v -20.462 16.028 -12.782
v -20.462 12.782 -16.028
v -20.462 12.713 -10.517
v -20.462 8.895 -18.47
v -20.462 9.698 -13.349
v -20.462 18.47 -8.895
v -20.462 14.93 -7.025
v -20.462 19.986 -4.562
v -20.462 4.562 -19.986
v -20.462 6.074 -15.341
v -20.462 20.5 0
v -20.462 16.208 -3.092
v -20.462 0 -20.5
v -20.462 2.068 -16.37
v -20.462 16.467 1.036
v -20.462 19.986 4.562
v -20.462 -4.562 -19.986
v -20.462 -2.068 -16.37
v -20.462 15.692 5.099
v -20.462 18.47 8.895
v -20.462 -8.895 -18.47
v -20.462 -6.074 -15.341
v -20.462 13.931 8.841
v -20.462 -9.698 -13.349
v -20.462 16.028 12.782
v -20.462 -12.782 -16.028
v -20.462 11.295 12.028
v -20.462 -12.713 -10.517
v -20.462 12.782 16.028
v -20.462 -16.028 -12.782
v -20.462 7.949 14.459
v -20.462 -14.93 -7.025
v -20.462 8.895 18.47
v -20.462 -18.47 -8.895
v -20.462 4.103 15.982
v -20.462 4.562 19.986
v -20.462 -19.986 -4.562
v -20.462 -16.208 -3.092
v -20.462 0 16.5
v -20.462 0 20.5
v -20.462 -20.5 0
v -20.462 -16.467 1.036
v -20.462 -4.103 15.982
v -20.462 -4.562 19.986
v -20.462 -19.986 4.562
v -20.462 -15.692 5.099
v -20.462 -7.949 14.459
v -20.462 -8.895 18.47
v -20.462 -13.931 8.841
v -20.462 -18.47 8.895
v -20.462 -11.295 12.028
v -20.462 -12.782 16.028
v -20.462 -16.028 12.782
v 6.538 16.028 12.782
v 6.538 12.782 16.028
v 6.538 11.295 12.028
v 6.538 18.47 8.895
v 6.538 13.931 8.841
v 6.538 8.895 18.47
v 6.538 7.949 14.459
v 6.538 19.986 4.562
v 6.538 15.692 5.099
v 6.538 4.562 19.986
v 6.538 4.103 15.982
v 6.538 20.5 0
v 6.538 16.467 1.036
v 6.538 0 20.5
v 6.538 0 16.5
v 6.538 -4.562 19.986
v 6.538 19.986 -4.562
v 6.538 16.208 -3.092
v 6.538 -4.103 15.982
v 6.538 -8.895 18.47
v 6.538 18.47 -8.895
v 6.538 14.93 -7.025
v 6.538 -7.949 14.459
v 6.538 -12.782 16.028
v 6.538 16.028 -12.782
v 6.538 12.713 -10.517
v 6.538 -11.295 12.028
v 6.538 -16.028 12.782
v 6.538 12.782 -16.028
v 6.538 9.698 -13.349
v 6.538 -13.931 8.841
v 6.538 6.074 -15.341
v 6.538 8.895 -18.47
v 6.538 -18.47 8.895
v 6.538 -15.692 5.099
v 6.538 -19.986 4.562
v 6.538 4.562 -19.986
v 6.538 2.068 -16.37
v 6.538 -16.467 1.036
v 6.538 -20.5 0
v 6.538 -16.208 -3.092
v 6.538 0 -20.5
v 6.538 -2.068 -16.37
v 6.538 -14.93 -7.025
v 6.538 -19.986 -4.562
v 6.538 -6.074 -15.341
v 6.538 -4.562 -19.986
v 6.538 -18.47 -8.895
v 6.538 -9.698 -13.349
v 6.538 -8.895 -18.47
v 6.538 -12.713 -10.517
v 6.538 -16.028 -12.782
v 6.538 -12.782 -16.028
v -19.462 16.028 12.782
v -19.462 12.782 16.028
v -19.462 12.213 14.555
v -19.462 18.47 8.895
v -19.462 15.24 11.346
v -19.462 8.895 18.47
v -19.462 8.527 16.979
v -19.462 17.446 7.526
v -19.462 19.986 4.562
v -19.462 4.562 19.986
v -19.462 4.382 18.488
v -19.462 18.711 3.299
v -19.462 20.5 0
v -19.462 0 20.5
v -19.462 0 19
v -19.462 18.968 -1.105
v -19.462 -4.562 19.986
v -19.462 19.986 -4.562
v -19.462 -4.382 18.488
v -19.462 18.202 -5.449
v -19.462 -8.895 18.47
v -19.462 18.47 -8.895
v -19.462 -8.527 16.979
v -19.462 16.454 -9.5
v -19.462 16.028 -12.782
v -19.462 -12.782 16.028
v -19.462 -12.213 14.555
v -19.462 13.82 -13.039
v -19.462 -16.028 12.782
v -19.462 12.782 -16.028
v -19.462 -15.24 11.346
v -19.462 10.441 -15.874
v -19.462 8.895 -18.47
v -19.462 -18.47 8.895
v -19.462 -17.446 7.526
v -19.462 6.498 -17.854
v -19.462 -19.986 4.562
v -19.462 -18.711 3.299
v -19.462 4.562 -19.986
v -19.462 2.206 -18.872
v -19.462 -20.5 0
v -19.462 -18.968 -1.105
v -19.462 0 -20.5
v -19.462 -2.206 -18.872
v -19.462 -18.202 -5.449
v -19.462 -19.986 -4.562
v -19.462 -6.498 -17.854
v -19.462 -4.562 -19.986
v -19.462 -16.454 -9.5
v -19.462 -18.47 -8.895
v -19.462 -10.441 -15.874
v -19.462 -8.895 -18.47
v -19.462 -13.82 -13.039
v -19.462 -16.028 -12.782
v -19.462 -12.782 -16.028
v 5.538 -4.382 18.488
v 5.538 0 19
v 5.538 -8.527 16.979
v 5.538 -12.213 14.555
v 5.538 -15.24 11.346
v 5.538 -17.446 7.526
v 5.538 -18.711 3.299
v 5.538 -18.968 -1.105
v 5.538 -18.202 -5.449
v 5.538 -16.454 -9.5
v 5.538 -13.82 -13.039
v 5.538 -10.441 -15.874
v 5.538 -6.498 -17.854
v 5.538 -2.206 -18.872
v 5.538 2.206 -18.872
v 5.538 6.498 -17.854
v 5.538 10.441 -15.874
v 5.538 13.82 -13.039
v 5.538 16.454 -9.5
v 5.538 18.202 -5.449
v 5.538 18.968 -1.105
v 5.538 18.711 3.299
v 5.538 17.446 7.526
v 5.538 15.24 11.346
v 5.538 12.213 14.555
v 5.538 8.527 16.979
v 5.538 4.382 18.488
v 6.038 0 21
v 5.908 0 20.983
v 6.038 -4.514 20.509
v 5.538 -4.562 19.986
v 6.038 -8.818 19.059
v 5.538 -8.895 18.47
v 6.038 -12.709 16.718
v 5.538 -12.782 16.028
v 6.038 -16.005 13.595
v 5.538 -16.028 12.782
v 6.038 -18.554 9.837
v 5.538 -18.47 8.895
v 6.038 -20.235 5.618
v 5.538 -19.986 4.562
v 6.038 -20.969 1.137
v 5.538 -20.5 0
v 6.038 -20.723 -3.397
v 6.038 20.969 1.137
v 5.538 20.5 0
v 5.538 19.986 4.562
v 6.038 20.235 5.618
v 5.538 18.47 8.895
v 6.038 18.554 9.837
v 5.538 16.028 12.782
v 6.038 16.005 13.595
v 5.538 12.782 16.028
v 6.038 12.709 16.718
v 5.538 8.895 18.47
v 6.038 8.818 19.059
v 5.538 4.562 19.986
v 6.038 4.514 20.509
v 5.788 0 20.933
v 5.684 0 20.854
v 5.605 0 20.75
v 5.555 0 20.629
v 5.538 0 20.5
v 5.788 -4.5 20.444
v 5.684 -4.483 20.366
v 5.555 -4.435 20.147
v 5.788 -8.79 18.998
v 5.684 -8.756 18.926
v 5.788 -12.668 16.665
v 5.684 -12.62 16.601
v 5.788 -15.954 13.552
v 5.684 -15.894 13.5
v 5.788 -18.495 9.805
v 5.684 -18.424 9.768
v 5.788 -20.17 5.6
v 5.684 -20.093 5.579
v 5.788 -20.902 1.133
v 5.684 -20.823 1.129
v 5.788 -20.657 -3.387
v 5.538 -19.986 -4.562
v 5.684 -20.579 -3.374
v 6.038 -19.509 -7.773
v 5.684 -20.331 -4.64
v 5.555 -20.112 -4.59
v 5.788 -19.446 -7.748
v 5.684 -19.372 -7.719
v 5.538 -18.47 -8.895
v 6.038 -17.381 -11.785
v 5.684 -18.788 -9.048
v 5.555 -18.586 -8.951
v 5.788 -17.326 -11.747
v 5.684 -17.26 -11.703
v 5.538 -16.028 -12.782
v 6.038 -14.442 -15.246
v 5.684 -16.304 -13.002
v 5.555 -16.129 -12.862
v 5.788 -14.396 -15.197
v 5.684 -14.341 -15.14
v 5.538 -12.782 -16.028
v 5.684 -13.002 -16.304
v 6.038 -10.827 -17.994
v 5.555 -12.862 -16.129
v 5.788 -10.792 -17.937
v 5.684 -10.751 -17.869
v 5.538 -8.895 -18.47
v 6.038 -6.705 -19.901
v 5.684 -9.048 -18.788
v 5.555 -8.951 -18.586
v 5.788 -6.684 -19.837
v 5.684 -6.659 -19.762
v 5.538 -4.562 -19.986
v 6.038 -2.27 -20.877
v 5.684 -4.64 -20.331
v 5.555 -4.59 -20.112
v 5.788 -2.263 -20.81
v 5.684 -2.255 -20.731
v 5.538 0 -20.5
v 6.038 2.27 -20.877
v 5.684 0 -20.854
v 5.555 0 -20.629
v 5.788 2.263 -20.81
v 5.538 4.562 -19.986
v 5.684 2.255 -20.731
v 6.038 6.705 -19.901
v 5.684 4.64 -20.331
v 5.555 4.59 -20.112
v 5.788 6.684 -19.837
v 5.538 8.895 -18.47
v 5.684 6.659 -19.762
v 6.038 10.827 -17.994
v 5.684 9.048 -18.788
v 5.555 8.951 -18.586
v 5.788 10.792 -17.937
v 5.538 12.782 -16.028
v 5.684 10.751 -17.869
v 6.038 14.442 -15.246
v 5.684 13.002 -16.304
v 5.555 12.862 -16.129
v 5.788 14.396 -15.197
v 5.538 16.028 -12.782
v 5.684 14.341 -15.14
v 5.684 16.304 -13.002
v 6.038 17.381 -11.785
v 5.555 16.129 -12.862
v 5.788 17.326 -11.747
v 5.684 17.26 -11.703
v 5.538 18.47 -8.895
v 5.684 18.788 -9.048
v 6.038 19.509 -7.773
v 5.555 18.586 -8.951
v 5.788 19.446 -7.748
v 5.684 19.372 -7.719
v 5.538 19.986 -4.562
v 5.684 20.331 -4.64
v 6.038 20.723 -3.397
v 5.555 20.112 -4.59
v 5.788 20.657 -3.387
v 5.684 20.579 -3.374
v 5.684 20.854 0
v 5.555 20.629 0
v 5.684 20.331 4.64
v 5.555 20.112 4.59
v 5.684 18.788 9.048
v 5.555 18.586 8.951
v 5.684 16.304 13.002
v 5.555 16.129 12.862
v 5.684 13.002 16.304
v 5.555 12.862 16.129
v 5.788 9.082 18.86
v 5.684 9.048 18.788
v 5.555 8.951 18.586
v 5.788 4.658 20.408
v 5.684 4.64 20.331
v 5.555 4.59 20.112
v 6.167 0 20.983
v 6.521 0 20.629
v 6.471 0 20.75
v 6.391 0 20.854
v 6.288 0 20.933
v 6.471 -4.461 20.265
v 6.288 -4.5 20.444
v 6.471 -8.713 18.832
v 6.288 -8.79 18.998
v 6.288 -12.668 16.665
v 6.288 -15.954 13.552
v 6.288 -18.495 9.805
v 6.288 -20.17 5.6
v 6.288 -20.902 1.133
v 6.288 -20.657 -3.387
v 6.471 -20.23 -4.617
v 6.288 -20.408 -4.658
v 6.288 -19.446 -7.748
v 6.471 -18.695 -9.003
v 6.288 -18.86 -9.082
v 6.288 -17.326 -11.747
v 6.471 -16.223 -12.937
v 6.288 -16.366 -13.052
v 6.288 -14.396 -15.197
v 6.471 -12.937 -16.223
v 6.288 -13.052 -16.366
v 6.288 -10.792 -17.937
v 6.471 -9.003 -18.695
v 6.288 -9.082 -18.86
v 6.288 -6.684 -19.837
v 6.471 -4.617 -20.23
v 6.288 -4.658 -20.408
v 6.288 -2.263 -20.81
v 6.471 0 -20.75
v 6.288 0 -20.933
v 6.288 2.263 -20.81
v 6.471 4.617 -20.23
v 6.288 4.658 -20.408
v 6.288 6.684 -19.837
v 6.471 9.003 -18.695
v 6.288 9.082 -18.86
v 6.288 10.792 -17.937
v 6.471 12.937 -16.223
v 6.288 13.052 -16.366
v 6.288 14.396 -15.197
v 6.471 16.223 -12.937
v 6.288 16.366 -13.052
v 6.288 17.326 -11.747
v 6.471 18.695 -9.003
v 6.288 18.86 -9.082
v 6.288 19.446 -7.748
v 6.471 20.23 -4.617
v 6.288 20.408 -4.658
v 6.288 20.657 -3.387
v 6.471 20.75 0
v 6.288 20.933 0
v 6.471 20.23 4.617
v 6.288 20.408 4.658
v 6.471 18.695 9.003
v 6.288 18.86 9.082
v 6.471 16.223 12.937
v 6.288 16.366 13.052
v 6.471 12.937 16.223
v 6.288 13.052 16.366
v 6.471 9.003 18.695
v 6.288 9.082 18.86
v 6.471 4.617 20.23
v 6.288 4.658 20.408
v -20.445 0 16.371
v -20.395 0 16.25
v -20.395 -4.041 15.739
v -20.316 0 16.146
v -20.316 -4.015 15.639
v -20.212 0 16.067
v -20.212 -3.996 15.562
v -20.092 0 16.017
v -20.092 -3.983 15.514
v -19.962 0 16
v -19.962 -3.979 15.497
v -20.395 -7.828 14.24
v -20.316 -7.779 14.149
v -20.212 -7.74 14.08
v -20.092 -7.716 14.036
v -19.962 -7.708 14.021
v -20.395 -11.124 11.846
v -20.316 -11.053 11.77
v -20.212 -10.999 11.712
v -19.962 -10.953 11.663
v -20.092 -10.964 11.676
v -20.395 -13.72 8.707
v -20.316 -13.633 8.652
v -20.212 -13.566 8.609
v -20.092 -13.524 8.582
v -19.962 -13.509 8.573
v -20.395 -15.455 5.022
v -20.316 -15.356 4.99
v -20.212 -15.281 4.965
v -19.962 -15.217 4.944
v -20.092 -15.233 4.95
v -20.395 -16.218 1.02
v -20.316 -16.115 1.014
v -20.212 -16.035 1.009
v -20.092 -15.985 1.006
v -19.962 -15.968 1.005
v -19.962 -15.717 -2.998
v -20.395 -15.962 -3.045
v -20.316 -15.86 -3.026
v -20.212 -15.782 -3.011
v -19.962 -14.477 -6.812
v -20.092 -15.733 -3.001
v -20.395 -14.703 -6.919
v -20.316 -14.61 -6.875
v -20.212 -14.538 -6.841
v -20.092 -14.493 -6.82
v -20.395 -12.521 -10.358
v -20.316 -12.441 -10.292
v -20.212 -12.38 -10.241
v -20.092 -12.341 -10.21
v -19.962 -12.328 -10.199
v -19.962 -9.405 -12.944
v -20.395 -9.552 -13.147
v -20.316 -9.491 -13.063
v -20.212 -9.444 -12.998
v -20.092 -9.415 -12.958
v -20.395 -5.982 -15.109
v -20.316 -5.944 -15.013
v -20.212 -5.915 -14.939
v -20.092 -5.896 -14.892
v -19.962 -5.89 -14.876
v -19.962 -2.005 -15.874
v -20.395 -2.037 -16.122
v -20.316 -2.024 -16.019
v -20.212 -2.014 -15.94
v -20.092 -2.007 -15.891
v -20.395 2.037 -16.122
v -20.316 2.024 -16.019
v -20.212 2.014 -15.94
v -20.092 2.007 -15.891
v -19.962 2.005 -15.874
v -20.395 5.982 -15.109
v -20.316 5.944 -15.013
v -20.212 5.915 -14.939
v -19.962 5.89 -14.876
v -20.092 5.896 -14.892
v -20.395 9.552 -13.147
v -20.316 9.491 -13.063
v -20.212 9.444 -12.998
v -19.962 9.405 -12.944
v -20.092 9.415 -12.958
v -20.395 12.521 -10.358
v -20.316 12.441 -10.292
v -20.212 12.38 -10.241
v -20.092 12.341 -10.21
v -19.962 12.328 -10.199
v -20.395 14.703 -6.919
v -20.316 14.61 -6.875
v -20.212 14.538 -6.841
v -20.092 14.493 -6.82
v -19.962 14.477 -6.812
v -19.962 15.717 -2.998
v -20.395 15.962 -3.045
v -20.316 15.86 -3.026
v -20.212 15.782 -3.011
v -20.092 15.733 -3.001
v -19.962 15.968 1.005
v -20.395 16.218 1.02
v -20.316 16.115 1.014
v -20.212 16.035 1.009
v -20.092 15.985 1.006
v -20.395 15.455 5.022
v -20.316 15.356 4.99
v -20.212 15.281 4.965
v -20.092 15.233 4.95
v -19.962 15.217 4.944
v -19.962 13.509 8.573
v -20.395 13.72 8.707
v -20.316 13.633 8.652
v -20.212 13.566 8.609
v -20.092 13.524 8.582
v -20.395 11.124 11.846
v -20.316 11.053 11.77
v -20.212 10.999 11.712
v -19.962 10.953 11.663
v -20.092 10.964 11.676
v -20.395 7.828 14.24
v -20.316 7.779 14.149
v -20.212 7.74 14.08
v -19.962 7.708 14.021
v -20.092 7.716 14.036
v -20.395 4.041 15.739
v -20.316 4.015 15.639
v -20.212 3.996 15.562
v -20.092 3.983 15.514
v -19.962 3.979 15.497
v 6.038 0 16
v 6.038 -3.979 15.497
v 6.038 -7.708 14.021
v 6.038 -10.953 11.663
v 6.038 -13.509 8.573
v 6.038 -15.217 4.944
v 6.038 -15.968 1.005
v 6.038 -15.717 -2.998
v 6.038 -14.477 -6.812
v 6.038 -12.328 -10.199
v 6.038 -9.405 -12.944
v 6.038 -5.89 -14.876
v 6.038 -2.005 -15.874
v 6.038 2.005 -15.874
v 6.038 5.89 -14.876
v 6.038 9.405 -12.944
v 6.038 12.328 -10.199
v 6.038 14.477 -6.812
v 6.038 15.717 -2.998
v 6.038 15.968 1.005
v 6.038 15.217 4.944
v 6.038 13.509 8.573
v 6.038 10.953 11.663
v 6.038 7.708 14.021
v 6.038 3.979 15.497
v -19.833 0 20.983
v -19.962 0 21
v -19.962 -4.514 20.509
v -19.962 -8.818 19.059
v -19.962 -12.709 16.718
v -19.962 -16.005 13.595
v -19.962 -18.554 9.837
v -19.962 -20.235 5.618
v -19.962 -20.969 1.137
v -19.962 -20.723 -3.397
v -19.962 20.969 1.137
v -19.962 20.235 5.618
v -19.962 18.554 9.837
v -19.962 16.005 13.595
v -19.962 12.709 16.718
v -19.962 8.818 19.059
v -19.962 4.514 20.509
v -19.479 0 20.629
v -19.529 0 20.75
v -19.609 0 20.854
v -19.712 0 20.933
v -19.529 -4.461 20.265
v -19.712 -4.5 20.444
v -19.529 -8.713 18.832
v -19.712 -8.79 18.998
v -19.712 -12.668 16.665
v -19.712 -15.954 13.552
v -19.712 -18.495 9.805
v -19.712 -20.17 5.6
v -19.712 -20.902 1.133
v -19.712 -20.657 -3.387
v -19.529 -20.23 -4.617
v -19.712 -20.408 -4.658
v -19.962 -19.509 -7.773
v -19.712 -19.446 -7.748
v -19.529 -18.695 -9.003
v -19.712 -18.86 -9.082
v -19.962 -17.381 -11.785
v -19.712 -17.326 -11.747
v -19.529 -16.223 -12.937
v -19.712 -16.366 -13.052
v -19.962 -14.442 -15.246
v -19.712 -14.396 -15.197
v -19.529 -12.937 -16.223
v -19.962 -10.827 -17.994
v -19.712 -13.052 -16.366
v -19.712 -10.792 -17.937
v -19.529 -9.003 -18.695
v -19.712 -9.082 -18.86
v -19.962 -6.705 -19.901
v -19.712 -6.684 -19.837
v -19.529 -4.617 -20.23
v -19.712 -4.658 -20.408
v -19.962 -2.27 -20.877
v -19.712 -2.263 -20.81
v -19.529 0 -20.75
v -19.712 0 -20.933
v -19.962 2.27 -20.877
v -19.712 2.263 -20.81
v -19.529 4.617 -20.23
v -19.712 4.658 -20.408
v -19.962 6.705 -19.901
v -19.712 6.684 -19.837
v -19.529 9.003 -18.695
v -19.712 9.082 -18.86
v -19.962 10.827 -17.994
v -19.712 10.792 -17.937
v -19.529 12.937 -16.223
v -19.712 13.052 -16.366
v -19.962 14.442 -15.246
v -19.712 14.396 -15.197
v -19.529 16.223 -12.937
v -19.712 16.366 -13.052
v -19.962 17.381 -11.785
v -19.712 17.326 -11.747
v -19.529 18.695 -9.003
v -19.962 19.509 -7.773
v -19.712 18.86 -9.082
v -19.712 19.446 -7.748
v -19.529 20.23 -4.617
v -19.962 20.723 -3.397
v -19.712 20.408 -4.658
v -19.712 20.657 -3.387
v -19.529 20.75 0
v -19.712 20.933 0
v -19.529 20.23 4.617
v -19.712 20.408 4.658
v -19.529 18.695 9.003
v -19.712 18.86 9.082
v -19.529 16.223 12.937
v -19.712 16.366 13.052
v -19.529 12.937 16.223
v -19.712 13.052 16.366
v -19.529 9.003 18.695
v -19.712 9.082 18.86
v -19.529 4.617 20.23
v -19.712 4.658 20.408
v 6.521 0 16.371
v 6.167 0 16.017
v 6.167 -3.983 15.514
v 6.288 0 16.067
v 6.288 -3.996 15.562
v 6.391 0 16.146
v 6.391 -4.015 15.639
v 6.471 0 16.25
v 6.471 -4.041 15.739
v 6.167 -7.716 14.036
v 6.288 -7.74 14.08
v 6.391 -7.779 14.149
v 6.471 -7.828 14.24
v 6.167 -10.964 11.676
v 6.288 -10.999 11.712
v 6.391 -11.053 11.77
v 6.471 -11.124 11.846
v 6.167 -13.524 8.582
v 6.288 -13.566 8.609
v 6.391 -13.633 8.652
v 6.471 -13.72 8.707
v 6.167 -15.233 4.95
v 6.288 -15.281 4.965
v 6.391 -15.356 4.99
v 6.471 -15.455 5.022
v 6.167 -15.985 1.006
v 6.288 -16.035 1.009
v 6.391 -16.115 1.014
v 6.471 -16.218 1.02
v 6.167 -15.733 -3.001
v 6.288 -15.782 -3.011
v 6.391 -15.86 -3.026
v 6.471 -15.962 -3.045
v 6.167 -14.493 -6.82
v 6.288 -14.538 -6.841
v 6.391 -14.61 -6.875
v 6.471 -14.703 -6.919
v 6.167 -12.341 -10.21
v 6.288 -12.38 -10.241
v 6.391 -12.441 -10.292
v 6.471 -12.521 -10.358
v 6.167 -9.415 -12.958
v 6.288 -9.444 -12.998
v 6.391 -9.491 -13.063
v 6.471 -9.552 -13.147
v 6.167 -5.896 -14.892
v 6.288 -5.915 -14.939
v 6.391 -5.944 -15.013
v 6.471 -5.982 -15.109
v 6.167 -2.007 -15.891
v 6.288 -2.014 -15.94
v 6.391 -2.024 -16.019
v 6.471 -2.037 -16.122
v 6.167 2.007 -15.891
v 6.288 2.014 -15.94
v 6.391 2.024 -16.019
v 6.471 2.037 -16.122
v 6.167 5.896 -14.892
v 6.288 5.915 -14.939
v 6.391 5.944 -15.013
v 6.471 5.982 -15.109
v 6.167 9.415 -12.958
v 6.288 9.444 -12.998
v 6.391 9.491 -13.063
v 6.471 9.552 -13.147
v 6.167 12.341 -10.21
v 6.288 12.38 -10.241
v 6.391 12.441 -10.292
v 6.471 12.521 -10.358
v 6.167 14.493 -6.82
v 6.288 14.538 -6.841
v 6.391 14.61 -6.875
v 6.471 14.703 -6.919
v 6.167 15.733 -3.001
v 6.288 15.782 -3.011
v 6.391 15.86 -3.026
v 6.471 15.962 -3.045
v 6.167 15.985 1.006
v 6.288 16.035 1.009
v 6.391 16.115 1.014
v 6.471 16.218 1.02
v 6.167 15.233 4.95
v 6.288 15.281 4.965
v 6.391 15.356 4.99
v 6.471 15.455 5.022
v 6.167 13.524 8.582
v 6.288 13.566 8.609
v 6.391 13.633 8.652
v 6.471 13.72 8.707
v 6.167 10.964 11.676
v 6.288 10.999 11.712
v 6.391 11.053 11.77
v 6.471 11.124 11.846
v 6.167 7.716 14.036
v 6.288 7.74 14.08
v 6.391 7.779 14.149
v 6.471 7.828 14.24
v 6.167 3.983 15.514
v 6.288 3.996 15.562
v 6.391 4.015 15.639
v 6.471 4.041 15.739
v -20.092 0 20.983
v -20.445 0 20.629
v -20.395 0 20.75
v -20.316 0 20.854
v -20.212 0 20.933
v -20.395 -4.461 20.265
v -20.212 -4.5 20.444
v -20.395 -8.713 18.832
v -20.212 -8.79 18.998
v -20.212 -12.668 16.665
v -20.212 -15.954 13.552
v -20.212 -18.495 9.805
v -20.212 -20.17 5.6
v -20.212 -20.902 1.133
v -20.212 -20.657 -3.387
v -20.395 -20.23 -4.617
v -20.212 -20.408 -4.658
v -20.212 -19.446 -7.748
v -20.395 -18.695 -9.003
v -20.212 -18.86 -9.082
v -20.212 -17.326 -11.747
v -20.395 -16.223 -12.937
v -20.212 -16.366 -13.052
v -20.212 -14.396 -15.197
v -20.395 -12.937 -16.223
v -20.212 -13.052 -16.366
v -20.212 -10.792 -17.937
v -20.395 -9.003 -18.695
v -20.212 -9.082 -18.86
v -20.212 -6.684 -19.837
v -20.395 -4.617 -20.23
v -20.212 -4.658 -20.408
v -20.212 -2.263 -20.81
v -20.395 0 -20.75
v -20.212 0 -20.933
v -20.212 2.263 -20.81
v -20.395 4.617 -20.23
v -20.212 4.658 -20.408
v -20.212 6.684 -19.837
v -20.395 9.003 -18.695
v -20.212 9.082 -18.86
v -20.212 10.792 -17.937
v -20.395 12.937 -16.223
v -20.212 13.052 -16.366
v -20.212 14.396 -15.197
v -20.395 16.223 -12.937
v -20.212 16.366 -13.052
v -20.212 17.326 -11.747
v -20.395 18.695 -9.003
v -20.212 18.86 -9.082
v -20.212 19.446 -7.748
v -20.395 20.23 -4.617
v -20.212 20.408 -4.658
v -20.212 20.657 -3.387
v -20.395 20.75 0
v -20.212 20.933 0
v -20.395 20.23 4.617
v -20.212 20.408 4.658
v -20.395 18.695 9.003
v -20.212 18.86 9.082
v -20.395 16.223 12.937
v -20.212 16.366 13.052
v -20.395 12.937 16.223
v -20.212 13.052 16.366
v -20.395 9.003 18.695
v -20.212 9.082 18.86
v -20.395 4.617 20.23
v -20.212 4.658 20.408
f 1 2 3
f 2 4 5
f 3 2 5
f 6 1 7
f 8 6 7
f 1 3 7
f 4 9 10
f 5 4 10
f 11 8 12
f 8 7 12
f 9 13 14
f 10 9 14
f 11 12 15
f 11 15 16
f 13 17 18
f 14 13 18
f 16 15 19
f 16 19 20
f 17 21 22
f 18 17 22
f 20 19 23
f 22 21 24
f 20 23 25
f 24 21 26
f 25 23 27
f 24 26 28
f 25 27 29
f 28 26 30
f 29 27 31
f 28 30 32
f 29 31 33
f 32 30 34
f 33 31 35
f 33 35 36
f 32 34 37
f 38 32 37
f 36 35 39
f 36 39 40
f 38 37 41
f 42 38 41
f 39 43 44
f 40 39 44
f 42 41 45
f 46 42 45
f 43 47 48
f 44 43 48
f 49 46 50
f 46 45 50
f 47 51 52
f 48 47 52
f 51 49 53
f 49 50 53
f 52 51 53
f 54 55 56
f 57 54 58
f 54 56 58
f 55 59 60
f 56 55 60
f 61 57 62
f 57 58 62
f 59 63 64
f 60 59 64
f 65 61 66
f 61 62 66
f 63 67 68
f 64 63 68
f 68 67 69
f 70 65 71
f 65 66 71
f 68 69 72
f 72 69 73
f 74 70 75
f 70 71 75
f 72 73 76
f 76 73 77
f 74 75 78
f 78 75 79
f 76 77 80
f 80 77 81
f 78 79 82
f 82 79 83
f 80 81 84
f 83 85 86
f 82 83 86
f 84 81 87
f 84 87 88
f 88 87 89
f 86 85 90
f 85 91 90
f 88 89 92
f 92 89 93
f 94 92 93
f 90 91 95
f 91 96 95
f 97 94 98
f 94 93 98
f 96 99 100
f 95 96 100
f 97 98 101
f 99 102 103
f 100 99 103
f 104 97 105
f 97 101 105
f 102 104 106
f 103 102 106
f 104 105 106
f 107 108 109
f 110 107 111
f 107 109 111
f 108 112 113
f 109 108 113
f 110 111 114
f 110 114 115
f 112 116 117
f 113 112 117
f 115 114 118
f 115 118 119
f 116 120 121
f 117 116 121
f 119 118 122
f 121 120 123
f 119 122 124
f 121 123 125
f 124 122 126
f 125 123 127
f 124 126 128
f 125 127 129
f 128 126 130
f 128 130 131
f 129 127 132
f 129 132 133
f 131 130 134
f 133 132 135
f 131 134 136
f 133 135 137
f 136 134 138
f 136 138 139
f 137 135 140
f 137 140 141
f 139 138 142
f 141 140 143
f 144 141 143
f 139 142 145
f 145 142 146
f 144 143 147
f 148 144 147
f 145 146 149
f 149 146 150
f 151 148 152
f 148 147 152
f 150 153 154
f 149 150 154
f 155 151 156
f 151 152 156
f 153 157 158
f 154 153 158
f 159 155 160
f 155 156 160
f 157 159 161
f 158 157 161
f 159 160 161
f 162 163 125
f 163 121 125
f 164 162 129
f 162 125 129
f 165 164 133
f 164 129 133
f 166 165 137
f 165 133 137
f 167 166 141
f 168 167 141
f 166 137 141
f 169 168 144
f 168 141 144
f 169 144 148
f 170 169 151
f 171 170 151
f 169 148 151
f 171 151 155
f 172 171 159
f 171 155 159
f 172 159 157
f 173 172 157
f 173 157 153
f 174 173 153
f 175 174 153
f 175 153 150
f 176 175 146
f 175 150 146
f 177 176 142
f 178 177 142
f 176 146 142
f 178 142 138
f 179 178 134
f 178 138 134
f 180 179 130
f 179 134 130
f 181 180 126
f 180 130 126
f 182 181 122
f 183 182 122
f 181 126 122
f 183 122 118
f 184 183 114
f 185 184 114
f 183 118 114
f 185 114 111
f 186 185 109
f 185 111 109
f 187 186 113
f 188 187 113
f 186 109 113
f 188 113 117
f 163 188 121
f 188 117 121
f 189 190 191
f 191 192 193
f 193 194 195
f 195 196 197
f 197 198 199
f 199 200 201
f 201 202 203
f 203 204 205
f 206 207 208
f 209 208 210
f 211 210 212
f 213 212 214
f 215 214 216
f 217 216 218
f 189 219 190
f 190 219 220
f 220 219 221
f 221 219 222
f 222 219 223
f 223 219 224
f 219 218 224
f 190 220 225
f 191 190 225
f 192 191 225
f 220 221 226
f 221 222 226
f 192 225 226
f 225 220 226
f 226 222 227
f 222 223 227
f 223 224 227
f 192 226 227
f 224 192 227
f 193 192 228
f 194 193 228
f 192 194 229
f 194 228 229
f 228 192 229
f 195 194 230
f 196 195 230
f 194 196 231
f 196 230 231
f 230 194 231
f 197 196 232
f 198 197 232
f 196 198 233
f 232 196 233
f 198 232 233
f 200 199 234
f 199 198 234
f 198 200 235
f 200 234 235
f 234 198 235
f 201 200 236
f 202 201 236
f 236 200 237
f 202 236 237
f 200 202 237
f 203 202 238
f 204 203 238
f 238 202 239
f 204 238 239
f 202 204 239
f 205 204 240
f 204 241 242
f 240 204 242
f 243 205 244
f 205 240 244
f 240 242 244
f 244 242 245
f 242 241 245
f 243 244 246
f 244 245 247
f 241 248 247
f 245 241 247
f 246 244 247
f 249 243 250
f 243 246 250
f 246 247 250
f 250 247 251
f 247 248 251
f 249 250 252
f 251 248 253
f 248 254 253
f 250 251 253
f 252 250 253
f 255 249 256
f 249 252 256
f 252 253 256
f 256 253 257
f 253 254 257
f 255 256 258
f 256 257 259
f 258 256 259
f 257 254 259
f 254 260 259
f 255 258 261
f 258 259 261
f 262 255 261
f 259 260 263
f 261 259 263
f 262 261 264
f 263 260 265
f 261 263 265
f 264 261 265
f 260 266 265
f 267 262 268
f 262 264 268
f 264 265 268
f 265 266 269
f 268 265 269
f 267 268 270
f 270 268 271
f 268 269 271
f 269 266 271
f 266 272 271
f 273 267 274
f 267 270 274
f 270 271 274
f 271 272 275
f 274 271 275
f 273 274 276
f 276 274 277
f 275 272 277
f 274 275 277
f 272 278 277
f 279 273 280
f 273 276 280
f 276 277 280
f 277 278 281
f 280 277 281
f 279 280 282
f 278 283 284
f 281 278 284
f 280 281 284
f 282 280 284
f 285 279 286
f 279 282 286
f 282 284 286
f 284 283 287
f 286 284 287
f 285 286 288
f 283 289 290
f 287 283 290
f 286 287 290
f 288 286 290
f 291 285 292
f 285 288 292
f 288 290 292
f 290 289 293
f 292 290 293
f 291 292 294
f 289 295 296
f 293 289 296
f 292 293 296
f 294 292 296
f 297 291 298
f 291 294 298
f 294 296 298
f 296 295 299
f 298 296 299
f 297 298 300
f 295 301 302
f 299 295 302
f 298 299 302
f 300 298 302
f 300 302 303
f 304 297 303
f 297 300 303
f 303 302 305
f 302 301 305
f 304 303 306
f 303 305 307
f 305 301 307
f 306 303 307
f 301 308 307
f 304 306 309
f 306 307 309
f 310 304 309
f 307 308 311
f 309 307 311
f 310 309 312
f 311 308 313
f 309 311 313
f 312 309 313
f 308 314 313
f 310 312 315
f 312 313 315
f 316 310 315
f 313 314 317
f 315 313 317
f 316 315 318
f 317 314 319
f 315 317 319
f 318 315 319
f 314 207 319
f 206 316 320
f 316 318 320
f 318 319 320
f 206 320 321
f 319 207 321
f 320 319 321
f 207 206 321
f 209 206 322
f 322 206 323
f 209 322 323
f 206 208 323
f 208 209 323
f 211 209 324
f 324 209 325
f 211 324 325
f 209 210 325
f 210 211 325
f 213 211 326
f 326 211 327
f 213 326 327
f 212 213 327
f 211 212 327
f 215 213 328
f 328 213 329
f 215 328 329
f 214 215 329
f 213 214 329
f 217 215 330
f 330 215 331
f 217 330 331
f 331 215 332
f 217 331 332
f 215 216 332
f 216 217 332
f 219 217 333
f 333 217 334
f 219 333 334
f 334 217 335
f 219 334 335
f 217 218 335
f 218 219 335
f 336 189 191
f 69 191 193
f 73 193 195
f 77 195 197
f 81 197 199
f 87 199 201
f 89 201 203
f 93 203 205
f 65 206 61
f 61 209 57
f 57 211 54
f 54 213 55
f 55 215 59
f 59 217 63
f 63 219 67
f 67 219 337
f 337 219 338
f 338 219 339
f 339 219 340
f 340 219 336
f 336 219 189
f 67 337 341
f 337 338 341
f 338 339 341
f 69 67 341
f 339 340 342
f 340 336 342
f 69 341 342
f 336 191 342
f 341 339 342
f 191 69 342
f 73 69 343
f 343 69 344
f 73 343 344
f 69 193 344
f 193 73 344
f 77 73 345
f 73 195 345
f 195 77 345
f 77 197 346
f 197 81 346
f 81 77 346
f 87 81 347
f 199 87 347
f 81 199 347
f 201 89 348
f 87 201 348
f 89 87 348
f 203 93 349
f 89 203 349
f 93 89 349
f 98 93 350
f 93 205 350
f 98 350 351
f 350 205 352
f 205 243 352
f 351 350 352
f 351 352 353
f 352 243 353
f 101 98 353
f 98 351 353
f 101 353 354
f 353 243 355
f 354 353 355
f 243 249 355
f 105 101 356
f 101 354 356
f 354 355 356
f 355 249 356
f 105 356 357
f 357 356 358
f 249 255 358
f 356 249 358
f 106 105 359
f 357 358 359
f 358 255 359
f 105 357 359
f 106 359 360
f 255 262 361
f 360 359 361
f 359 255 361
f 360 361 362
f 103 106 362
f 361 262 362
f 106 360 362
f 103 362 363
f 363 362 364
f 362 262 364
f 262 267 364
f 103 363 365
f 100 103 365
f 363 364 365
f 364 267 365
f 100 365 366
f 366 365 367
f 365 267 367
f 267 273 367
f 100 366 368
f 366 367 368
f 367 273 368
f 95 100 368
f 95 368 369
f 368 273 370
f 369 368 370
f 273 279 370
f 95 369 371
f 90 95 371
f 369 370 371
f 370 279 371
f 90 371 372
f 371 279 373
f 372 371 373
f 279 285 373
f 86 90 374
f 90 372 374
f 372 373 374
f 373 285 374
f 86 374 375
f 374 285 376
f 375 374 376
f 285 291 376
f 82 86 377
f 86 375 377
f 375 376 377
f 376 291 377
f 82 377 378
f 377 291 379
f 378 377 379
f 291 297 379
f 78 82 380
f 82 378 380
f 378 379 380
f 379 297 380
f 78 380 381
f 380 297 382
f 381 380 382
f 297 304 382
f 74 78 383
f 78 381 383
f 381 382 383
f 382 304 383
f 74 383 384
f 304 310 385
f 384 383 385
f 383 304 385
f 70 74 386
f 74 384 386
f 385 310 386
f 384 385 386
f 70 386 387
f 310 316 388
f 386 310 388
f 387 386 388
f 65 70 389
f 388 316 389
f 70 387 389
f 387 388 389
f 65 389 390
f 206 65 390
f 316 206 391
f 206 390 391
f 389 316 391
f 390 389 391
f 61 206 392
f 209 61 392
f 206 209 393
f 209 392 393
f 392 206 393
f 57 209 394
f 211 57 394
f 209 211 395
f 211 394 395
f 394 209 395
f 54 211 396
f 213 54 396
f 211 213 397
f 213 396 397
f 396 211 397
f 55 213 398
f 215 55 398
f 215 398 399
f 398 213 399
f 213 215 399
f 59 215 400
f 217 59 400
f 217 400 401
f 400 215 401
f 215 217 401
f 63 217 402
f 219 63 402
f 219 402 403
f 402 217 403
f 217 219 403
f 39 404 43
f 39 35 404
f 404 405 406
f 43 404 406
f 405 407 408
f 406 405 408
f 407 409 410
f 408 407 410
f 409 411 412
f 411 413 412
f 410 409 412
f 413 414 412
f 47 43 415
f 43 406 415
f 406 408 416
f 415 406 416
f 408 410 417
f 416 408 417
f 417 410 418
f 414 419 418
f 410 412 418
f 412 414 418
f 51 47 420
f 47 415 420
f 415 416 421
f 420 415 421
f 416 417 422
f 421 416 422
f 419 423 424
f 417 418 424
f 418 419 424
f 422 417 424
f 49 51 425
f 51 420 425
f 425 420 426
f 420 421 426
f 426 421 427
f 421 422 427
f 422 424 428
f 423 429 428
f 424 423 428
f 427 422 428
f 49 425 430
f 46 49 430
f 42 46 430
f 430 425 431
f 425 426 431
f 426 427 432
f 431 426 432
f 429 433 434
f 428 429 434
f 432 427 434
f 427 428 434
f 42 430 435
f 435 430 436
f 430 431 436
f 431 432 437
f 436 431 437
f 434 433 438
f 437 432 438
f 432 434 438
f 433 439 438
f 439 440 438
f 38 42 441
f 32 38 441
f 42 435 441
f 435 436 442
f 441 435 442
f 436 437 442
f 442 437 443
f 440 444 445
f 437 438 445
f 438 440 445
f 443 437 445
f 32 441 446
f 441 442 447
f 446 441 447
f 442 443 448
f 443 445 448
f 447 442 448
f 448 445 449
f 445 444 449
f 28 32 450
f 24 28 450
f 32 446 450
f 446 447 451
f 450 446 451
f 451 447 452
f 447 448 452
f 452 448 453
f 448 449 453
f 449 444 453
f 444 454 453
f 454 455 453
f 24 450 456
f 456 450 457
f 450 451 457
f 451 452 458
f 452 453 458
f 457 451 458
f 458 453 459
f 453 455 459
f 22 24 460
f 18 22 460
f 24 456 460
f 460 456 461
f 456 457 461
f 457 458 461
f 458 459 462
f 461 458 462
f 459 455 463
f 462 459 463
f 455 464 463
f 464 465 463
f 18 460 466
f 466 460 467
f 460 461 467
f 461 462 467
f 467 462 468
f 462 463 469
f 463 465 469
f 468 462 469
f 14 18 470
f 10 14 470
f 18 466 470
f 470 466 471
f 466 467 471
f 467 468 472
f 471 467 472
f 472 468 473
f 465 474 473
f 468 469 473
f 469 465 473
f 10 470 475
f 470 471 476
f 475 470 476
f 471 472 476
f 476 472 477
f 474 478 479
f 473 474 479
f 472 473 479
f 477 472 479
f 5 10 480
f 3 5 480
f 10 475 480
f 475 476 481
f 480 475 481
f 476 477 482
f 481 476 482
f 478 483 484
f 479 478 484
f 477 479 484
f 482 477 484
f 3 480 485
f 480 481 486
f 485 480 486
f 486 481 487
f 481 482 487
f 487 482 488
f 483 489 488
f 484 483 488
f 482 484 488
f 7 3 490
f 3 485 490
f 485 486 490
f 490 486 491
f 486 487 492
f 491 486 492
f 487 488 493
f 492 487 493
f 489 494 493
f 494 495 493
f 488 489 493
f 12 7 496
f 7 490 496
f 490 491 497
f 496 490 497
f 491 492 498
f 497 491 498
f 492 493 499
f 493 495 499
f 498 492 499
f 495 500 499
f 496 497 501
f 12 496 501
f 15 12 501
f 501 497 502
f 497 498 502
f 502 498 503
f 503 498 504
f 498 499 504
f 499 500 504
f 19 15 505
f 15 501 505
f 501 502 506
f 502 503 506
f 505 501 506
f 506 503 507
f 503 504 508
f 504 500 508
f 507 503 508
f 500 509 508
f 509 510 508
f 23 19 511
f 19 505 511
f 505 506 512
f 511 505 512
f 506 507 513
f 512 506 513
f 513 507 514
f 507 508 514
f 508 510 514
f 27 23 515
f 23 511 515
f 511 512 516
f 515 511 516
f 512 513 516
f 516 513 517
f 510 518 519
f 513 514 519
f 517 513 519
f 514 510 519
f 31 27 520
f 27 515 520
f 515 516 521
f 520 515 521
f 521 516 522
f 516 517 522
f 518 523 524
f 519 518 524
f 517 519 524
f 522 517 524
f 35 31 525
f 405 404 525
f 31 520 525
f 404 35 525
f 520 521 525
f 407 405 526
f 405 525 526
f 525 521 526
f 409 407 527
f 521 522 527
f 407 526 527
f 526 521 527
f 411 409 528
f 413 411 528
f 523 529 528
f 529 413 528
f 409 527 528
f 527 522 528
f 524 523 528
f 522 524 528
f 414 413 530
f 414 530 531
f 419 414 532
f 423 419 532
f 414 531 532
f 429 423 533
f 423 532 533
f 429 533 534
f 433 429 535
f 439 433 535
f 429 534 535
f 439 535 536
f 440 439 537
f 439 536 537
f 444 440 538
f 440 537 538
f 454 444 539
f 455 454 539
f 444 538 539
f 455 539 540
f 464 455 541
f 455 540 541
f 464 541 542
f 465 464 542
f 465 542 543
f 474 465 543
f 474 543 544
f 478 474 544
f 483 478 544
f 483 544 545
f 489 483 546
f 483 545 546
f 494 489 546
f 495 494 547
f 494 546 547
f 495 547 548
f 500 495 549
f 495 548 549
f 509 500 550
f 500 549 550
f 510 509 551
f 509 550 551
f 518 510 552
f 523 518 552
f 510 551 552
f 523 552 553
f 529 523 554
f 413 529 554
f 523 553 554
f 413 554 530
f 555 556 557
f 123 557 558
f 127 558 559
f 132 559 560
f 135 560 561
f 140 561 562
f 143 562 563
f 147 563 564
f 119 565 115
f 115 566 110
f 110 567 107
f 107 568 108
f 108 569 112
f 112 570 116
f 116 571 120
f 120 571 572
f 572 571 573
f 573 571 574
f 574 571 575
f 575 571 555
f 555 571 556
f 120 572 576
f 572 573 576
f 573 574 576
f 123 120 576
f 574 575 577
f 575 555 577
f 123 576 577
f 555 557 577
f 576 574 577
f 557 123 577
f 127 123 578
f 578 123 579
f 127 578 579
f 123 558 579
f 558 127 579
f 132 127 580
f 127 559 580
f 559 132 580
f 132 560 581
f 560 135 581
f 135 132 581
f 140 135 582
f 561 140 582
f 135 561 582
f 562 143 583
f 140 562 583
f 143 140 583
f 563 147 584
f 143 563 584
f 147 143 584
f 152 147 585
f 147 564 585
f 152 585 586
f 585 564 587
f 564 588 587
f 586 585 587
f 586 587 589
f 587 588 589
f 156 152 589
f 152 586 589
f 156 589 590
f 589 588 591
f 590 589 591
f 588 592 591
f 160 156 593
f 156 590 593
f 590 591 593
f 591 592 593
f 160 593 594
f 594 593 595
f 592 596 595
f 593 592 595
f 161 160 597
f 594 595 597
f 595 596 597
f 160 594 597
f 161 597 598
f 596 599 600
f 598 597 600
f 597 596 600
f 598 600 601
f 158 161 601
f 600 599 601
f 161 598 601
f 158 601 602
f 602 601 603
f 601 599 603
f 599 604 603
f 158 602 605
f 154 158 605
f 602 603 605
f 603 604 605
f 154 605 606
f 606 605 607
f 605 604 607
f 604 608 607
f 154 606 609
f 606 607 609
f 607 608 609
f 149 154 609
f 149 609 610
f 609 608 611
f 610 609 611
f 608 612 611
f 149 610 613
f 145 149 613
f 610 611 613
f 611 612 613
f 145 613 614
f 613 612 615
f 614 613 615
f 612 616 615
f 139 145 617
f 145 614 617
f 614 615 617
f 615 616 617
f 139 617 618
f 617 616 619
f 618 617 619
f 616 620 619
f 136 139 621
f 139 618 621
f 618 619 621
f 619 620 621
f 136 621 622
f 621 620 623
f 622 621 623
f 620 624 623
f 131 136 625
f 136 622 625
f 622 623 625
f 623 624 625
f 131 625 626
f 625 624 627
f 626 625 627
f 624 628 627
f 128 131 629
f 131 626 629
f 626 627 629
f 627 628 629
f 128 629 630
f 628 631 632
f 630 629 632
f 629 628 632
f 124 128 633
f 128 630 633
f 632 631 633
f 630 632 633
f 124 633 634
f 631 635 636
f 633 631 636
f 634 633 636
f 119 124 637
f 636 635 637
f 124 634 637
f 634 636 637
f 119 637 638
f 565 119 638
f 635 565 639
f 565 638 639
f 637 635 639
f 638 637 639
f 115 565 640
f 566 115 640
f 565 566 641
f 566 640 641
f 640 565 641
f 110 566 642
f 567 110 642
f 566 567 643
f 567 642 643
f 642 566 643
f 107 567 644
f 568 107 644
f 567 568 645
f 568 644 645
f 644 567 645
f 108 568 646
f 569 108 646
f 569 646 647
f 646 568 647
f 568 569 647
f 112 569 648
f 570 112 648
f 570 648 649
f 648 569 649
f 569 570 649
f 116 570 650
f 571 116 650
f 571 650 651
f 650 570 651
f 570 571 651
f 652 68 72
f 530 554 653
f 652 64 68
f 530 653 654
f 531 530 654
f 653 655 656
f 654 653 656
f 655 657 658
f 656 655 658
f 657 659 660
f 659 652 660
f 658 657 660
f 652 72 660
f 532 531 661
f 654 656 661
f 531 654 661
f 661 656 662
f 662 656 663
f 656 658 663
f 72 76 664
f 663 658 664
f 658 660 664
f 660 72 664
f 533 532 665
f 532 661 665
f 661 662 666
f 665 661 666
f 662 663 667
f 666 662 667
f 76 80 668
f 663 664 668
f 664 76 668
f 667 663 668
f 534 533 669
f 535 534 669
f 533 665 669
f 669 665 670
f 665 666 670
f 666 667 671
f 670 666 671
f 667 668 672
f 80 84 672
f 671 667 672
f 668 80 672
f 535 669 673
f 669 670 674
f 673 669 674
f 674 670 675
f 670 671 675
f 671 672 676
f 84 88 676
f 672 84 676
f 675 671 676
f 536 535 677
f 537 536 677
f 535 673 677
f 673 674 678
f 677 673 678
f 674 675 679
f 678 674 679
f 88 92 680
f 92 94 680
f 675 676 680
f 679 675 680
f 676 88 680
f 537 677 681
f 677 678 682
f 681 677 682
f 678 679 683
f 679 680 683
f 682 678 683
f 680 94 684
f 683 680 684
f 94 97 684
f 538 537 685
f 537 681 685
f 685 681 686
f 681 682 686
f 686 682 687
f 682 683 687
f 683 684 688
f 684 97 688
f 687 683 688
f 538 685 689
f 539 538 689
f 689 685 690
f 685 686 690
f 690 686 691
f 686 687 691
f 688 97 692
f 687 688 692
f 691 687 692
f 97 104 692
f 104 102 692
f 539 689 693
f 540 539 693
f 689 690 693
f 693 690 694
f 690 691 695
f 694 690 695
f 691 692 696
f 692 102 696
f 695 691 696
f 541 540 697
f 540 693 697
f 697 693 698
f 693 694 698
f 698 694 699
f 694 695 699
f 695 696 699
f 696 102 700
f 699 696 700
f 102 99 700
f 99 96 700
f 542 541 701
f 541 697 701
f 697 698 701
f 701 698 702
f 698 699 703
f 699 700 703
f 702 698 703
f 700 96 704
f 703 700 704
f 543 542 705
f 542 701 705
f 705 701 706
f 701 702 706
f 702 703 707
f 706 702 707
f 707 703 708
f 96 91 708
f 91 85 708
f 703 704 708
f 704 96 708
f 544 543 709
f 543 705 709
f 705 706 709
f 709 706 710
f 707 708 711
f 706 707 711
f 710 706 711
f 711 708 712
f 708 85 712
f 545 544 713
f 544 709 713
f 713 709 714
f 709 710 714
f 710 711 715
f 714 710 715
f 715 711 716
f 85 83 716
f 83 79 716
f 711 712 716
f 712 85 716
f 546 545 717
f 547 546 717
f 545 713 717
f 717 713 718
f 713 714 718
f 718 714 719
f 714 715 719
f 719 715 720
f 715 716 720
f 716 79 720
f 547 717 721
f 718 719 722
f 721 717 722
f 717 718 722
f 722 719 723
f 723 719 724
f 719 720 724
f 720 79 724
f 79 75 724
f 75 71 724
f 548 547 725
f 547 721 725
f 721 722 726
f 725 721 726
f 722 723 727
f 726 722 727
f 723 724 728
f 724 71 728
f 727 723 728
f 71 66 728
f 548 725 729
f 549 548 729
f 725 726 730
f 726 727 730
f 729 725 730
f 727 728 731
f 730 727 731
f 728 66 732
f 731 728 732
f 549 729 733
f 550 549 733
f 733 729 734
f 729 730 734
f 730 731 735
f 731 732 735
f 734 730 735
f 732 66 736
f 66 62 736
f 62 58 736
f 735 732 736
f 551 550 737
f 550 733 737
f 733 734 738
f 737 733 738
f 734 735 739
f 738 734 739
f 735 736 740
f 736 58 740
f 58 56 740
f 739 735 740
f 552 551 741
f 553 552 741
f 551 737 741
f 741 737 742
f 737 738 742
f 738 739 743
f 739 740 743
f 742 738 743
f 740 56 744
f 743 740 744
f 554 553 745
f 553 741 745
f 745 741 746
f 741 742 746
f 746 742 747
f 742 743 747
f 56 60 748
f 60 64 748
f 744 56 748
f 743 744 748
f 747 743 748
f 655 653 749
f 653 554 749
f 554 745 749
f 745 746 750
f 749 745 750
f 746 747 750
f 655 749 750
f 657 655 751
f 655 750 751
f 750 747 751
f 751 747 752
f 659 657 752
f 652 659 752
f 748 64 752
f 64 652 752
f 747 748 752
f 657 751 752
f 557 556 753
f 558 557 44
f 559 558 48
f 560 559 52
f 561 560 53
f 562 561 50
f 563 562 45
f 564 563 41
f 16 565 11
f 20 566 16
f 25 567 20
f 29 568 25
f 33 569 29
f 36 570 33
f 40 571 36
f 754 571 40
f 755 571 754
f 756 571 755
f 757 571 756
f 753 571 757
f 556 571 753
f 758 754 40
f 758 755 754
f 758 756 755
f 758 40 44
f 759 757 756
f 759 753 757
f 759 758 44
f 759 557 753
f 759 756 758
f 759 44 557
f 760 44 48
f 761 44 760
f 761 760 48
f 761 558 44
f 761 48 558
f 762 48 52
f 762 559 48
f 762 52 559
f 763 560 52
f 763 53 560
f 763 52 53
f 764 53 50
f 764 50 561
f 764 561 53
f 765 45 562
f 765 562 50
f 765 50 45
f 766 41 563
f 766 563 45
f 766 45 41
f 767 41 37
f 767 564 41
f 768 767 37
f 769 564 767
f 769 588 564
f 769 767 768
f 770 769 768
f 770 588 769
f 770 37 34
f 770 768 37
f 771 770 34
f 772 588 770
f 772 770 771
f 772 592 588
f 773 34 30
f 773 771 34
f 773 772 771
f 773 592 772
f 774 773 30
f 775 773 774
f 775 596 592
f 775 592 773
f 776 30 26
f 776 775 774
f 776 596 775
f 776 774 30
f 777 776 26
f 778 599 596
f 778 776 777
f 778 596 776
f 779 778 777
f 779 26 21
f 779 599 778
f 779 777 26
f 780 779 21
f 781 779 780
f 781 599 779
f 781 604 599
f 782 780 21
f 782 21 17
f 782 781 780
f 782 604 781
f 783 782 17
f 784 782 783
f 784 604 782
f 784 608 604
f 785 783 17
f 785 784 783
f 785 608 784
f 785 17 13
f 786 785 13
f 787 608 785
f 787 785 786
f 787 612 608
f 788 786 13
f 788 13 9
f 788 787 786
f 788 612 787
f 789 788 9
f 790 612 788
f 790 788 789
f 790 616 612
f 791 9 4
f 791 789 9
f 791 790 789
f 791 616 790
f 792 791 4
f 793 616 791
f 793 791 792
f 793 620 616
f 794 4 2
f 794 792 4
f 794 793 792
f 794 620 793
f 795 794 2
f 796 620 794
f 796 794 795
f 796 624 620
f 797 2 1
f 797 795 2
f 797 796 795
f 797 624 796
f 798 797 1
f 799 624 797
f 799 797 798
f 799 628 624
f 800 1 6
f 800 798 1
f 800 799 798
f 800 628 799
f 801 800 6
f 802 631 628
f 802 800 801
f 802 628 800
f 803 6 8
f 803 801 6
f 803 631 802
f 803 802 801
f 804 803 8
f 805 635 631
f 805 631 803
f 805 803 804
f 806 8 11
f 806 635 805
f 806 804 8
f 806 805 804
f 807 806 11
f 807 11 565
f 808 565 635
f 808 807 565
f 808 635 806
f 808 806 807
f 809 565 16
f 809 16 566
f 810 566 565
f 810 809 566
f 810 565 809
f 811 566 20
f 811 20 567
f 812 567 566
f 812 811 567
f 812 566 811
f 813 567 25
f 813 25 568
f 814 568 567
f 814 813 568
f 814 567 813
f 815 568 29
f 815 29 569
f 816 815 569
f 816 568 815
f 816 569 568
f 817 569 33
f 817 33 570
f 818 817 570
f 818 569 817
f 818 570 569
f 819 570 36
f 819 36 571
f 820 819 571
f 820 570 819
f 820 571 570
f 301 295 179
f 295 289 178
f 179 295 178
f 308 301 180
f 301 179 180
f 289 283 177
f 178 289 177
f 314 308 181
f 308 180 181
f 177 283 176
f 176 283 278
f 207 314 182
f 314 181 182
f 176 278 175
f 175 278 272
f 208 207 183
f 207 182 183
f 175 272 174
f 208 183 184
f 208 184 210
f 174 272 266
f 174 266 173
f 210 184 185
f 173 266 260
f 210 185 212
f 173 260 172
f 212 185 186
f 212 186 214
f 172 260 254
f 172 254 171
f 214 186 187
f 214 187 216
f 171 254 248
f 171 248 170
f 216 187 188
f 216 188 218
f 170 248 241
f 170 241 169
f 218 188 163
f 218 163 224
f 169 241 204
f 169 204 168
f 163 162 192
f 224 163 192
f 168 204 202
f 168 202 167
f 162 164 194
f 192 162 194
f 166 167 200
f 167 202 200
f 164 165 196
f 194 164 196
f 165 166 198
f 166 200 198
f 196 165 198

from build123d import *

# Parameters (mm, degrees)
F3_R = 0.49999
F4_R = 0.5


# Not quite as in the source:
# - a fillet or chamfer is up to 0.001 mm smaller than in the source, because OpenCascade refuses the exact size


with BuildPart() as f2:
    # F0 (on Front) → F2 (revolve)
    with BuildSketch(Plane.XZ):
        Polygon((-20.462457691, 21), (-20.462457691, 16), (6.537542309, 16), (6.537542309, 21), (5.537542309, 21), (5.537542309, 19), (-19.462457691, 19), (-19.462457691, 21), align=None)
    revolve(axis=Axis((-6.0107018799, 0, 0), (1, 0, 0)))

    # F3 (radius 0.5 in the source; OpenCascade refuses exactly that, so slightly less here)
    f3_edges = [f2.edges().sort_by_distance(p)[0] for p in [
        (6.537542, 0, -21),
        (5.537542, 0, -21),
        (-19.462458, 0, -21),
        (-20.462458, 0, -21),
    ]]
    fillet(f3_edges, radius=F3_R)

    # F4
    f4_edges = [f2.edges().sort_by_distance(p)[0] for p in [
        (-20.462458, 0, -16),
        (6.537542, 0, -16),
    ]]
    fillet(f4_edges, radius=F4_R)


solid = f2.part
